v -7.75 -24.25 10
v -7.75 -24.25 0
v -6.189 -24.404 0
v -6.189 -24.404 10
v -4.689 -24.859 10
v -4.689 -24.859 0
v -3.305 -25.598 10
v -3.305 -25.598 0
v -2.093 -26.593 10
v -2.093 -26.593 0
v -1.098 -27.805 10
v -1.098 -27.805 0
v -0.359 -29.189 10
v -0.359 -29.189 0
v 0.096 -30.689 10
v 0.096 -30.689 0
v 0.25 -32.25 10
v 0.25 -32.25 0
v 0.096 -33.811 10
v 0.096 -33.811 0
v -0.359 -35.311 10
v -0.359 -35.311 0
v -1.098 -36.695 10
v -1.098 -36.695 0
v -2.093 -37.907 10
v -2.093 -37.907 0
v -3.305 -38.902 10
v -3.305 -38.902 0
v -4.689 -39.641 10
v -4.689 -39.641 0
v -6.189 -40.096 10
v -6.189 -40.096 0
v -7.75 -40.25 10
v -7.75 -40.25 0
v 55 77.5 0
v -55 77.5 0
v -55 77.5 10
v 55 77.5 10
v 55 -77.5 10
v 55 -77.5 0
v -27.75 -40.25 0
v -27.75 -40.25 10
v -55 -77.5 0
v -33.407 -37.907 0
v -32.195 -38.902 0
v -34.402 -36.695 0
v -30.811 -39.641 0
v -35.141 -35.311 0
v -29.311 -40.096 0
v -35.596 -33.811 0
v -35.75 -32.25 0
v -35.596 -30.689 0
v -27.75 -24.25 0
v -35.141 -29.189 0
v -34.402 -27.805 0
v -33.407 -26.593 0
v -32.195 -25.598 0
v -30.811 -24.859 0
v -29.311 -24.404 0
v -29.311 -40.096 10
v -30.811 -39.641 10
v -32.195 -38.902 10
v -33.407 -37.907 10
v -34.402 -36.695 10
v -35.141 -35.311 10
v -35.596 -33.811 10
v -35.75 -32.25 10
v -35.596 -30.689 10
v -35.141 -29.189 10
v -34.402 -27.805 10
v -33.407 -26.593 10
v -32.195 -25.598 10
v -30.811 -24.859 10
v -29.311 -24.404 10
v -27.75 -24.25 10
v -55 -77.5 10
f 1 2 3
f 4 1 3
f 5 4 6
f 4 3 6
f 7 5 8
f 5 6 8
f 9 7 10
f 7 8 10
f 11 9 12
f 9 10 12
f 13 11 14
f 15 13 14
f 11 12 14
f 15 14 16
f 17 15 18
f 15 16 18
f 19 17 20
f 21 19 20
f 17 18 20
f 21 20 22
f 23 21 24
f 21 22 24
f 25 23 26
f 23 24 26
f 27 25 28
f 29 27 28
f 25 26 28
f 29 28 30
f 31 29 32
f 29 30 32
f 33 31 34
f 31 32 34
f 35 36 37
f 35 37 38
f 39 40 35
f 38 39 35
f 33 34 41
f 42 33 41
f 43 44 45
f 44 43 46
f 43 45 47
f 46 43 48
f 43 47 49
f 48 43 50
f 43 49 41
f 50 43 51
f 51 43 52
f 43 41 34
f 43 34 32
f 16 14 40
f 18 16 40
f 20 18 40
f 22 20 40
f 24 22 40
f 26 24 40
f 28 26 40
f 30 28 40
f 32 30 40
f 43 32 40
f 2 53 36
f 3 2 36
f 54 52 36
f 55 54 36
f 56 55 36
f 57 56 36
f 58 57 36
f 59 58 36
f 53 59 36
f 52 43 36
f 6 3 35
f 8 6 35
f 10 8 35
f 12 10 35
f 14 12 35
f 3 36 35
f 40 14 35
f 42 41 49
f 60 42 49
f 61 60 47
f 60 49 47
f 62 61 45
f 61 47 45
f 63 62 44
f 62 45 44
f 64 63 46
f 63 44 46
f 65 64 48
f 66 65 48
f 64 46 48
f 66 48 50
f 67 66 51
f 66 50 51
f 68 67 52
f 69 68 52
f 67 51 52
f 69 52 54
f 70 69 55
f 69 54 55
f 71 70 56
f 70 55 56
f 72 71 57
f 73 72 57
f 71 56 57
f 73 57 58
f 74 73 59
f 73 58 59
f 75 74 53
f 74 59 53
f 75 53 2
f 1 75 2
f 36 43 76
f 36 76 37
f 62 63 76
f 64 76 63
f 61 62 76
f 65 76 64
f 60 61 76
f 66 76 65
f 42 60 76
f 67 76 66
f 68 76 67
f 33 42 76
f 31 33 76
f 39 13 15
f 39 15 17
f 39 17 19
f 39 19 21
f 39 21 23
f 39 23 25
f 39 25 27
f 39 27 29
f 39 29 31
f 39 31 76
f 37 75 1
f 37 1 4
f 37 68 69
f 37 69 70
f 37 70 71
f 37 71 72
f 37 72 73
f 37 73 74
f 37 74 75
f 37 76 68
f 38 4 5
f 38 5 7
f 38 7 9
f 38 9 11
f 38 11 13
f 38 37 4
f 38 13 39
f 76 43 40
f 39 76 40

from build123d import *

# Parameters (mm, degrees)
SKETCH_1_W               = 110
SKETCH_1_H               = 155
EXTRUDE_1_DEPTH          = 10
CUT_EXTRUDE_1_DEPTH      = 96.557574268
CUT_EXTRUDE_1_DEPTH_BACK = 96.557574268


with BuildPart() as part:
    # 草图1 → 凸台-拉伸1 (new body)
    with BuildSketch(Plane.XY):
        Rectangle(SKETCH_1_W, SKETCH_1_H)
    extrude(amount=EXTRUDE_1_DEPTH)

    # 草图2 → 切除-拉伸1 (cut, two sides: drawn at the far end of the back side and taken through both)
    with BuildSketch(Plane.XY.offset(10).offset(-CUT_EXTRUDE_1_DEPTH_BACK)):
        with BuildLine():
            Line((-27.75, -24.25), (-7.75, -24.25))
            ThreePointArc((-7.75, -24.25), (0.25, -32.25), (-7.75, -40.25))
            Line((-7.75, -40.25), (-27.75, -40.25))
            ThreePointArc((-27.75, -40.25), (-35.75, -32.25), (-27.75, -24.25))
        make_face()
    extrude(amount=CUT_EXTRUDE_1_DEPTH + CUT_EXTRUDE_1_DEPTH_BACK, mode=Mode.SUBTRACT)


solid = part.part
